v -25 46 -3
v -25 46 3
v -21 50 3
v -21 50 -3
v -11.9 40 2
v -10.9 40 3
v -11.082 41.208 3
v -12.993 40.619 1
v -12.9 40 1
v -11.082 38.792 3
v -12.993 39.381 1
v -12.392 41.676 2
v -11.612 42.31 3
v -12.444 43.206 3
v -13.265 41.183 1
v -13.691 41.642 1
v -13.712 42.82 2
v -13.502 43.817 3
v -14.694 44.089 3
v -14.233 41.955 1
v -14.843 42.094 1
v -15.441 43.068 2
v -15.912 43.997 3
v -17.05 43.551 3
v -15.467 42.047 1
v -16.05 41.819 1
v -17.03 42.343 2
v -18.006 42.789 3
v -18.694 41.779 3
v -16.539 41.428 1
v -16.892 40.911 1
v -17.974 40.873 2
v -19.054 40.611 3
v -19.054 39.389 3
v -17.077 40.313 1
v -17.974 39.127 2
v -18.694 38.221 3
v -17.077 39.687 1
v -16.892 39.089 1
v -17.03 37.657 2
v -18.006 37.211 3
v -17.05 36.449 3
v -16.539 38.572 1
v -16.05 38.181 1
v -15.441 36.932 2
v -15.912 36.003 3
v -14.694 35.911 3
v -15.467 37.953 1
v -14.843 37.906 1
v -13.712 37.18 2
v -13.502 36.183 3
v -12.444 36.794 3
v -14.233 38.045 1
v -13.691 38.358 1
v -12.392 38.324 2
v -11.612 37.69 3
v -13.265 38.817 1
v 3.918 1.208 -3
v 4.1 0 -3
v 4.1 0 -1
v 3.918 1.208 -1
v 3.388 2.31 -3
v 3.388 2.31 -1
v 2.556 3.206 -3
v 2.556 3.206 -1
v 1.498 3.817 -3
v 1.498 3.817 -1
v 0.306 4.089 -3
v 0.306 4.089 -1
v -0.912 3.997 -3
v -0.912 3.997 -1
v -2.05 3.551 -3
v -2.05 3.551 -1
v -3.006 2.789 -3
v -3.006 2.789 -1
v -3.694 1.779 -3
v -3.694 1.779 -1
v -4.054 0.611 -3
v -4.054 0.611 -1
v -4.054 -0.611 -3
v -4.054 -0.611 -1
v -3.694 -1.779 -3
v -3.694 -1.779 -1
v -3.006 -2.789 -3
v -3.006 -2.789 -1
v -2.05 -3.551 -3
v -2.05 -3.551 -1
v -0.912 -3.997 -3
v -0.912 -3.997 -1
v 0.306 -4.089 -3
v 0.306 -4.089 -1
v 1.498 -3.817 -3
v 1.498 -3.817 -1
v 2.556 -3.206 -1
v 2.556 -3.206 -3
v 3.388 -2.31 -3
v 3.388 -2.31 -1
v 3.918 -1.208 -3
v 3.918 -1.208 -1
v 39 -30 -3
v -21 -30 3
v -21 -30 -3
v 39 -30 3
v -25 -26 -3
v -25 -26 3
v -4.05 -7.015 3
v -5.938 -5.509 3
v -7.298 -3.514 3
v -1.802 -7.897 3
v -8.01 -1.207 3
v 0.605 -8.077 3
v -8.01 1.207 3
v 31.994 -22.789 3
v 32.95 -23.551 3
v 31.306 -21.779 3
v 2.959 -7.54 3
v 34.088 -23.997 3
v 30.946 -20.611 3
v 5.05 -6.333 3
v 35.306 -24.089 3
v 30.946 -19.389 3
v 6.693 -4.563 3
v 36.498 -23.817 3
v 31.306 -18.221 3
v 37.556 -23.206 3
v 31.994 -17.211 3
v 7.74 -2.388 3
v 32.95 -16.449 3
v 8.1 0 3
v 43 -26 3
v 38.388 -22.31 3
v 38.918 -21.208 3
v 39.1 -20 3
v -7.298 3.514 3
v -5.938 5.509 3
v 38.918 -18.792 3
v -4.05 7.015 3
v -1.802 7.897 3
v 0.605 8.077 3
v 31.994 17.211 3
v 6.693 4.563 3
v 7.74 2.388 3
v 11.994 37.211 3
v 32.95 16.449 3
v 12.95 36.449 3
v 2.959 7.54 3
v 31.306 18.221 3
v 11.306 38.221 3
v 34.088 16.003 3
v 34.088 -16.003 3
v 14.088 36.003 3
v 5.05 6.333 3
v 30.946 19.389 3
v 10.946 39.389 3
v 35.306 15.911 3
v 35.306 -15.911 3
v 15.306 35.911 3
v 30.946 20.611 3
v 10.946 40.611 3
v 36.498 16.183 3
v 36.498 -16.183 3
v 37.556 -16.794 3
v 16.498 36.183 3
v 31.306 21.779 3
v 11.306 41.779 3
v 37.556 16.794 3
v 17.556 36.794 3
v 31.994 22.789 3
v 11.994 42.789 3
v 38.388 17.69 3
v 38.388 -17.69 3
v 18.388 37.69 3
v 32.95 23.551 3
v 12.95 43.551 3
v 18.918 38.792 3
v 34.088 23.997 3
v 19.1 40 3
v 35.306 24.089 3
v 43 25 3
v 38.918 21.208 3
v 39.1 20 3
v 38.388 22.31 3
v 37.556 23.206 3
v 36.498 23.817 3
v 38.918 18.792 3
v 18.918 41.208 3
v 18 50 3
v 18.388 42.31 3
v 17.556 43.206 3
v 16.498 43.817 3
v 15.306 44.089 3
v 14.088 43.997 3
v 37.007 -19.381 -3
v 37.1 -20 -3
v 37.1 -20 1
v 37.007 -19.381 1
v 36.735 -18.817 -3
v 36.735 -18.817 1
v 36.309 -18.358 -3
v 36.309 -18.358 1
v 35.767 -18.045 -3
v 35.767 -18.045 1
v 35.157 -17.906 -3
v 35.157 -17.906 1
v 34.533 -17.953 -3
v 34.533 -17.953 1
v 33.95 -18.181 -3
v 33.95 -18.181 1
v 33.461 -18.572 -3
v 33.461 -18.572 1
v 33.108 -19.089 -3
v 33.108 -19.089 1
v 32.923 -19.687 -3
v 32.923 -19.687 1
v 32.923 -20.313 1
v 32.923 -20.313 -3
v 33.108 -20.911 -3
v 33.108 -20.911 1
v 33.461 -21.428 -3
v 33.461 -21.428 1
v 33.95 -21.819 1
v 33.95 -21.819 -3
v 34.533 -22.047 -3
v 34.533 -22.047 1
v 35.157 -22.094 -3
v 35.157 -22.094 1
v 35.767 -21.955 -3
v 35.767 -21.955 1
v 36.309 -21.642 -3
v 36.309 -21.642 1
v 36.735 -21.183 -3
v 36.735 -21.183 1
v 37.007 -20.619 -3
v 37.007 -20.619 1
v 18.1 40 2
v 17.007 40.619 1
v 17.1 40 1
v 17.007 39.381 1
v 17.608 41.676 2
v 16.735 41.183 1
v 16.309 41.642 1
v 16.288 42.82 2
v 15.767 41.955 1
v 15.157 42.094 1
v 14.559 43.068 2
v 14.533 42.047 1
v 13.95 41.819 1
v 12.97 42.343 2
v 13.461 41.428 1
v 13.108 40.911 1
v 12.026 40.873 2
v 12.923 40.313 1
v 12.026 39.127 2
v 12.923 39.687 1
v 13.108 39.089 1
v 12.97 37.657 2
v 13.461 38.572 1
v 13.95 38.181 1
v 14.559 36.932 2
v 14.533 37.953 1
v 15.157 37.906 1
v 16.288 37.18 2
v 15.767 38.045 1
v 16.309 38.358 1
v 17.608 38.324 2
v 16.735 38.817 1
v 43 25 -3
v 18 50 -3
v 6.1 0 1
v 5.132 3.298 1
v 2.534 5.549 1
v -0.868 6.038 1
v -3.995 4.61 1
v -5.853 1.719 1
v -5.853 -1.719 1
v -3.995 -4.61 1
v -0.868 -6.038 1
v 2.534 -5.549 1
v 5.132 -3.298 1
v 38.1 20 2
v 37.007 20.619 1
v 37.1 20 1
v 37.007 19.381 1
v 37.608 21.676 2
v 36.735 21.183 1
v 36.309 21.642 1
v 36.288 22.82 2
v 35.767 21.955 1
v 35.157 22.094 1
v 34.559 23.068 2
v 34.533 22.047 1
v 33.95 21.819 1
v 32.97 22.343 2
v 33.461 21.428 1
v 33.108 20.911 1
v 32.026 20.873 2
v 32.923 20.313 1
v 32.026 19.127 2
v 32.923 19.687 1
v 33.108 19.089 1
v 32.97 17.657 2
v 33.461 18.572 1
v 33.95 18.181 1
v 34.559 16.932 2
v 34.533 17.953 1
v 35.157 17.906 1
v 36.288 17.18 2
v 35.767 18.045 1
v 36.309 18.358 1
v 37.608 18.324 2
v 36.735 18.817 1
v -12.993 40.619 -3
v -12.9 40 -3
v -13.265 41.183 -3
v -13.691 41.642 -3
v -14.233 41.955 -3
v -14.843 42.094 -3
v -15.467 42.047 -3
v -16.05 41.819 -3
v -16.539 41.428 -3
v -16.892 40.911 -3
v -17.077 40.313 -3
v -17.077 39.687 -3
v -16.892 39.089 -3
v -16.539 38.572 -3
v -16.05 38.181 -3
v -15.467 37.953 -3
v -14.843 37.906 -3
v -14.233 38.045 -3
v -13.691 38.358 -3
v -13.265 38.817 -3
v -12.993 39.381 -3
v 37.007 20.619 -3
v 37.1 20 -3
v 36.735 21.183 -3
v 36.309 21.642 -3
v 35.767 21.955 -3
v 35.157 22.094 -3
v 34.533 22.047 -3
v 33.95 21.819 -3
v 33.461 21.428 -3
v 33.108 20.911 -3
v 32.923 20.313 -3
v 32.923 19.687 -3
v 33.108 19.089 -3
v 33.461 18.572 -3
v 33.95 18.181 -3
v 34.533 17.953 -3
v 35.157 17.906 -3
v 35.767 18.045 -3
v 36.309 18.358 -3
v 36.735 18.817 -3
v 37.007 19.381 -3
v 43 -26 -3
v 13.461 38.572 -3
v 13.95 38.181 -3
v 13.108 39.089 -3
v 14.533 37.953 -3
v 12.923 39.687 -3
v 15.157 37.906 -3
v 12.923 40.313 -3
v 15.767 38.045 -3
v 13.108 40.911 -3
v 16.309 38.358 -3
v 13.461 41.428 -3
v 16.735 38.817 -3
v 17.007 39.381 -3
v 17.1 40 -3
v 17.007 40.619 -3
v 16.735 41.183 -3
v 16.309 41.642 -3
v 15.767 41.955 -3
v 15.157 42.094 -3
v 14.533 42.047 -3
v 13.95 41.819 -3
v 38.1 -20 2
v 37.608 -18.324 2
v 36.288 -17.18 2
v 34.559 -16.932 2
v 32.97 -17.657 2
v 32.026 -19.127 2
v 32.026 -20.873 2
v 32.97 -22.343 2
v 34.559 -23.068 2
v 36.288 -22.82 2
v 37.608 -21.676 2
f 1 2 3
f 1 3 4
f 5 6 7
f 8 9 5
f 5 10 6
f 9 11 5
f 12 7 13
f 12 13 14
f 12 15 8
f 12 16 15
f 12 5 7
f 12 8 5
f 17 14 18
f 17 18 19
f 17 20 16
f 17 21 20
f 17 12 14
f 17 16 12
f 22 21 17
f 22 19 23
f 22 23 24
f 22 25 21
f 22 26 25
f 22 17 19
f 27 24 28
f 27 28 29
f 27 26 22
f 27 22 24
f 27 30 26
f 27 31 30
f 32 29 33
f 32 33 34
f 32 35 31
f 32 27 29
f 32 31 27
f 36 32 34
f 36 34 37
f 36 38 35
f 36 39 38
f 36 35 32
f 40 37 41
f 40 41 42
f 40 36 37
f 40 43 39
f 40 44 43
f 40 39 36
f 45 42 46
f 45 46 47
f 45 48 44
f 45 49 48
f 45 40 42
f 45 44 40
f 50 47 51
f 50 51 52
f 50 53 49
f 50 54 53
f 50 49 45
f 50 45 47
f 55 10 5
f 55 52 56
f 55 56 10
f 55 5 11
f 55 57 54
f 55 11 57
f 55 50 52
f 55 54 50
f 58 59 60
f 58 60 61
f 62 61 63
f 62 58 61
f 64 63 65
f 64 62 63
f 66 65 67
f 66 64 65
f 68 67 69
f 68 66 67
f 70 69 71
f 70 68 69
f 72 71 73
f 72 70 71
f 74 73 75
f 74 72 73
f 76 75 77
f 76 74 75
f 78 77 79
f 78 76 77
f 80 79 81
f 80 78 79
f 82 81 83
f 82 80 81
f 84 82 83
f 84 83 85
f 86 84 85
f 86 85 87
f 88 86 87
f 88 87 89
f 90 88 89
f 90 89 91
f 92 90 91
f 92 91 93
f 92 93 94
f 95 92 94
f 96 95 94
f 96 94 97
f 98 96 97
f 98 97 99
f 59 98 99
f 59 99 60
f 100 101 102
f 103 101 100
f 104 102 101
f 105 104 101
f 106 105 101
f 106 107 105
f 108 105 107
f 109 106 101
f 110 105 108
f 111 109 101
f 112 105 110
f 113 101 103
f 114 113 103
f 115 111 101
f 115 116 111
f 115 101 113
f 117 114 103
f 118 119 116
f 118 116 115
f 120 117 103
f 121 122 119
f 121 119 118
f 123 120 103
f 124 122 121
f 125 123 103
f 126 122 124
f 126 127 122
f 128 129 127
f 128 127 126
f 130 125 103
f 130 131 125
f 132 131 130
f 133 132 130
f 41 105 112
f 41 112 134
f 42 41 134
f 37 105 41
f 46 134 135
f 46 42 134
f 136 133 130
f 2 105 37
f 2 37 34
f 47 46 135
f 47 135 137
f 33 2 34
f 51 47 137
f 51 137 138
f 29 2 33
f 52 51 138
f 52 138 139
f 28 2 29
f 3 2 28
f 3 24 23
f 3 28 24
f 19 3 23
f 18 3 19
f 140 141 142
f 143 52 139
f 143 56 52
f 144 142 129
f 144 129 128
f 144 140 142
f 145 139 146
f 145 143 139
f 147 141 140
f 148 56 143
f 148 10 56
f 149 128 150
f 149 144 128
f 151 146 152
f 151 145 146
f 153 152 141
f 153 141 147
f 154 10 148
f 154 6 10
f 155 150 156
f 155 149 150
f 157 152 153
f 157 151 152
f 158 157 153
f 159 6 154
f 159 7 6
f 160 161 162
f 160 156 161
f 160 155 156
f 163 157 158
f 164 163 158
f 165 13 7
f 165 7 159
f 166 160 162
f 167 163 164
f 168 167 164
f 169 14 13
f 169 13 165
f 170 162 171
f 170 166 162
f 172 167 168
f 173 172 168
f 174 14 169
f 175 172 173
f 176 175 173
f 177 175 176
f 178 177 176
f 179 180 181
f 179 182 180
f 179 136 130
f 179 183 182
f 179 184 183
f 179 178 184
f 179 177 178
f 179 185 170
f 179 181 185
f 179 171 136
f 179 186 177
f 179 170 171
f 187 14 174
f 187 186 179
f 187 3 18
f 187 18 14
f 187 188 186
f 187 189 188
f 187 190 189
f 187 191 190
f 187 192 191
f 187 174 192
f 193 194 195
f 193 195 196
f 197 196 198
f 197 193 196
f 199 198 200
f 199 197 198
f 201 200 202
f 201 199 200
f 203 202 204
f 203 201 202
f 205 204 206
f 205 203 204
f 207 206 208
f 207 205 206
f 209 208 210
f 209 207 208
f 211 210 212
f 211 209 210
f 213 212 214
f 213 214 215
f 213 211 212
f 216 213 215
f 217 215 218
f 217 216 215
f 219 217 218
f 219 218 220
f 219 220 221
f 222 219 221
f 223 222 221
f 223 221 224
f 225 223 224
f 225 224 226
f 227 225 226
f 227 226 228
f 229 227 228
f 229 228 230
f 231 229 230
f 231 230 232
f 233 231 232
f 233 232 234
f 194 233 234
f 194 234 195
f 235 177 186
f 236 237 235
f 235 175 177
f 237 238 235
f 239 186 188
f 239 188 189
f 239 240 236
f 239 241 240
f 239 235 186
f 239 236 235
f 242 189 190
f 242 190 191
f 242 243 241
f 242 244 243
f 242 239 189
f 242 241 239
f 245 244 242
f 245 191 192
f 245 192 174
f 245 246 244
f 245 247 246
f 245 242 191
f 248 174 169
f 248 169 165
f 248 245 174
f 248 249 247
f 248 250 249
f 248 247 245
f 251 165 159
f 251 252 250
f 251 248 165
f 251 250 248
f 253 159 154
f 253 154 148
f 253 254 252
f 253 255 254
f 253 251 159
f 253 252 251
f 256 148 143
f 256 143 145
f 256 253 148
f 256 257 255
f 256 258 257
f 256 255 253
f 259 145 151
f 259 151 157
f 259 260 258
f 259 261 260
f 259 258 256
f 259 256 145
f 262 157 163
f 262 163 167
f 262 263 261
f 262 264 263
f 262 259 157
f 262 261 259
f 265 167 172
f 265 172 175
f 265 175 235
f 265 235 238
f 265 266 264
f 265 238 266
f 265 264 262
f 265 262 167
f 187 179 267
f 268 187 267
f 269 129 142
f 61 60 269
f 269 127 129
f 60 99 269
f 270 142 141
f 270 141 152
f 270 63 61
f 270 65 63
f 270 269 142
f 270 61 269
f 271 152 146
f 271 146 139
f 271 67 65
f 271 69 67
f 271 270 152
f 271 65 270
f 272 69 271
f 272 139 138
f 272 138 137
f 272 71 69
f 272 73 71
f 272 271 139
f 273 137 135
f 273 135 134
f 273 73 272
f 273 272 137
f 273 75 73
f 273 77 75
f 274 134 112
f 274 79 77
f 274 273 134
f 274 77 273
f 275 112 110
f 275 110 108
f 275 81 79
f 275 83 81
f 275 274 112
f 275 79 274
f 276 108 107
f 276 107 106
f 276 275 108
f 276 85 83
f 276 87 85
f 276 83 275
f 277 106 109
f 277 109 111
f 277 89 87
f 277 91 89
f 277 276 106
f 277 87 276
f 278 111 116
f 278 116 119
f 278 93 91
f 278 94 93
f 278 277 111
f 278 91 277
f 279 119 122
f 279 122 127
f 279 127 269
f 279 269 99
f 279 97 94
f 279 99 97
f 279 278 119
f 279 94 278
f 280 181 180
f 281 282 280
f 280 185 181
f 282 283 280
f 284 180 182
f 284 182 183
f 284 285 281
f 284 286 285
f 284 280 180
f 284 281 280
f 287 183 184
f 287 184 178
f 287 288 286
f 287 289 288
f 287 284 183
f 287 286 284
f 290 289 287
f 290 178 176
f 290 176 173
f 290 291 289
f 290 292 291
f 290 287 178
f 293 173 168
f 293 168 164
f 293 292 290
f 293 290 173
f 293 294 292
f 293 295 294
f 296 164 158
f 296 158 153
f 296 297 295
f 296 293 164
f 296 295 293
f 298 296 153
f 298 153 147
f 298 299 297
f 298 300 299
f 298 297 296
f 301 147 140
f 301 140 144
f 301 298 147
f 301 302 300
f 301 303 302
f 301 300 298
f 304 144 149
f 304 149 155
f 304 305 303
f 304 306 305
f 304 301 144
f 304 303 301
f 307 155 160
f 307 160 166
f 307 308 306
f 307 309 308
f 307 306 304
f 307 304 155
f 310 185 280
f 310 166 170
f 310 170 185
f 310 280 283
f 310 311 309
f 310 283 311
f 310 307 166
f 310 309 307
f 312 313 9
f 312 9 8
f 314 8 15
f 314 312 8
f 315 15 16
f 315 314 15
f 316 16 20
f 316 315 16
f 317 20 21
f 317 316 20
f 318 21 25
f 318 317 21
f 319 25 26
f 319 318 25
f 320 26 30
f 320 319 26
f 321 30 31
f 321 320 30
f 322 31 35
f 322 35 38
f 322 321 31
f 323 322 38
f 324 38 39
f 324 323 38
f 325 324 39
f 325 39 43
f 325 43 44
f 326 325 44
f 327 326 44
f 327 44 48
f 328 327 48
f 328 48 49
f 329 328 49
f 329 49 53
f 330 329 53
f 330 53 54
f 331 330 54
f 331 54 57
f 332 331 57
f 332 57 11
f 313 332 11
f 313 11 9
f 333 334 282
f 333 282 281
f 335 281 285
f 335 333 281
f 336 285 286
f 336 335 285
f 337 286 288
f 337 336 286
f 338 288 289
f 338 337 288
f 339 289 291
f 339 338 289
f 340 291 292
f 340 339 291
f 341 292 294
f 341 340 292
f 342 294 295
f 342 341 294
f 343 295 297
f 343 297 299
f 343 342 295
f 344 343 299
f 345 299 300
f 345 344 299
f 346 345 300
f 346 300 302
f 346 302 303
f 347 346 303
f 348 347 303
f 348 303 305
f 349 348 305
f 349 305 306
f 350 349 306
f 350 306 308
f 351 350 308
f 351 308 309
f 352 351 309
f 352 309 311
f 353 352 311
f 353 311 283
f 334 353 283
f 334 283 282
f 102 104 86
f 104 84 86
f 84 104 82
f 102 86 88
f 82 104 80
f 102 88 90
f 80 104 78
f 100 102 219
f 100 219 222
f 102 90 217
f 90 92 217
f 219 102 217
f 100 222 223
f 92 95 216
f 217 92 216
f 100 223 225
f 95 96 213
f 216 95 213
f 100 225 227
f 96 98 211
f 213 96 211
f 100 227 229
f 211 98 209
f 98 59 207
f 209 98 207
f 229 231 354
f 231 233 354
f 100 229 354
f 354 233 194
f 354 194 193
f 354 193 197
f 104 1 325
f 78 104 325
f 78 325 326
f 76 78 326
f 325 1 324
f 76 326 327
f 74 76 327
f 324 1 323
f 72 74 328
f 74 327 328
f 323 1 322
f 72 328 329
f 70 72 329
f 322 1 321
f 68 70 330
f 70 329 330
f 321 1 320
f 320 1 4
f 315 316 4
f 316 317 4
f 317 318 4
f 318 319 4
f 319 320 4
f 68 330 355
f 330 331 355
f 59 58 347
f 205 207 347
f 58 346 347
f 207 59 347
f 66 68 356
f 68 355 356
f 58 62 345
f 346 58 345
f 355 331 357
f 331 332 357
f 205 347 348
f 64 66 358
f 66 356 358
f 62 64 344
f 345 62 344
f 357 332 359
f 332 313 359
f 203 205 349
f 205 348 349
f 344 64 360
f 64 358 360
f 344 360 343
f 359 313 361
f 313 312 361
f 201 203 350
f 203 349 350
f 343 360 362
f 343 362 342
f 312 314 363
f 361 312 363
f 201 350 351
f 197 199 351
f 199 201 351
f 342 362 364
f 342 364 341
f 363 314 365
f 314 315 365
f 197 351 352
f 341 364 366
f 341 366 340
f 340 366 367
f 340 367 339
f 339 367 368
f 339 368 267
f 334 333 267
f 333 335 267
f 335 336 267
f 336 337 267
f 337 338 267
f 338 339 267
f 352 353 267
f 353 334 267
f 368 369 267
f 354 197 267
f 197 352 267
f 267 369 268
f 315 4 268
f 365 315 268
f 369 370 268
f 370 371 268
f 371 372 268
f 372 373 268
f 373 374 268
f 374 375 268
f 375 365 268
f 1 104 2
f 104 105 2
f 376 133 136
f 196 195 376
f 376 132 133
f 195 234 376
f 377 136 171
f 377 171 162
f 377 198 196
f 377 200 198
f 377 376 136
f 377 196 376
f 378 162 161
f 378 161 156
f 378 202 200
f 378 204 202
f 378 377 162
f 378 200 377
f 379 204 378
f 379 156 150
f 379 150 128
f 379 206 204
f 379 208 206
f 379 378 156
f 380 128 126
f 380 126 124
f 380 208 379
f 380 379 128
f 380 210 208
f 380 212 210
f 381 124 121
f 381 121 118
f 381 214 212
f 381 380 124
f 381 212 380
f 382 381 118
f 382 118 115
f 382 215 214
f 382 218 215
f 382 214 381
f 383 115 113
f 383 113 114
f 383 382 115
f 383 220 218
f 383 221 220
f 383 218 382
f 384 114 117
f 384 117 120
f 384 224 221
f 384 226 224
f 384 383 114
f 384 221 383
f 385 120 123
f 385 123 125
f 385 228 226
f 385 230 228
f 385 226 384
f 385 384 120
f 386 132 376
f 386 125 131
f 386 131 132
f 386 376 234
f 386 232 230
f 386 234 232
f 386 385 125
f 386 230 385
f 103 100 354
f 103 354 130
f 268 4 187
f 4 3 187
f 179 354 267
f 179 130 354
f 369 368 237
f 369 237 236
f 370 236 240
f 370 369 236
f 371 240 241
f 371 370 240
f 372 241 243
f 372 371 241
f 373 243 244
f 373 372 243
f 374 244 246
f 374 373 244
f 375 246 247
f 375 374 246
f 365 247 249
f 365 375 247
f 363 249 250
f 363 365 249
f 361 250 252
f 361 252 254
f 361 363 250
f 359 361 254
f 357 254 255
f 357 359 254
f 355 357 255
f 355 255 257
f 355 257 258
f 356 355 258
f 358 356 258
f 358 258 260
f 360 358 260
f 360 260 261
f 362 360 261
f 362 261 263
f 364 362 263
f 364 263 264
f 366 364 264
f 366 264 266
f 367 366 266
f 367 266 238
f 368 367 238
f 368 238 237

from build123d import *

# Parameters (mm, degrees)
SKETCH_1_W      = 68
SKETCH_1_H      = 80
SKETCH_1_R      = 4.1
SKETCH_1_R_2    = 2.1
EXTRUDE_1_DEPTH = 3
CHAMFER_1_SIZE  = 25
CHAMFER_2_SIZE  = 4
CHAMFER_3_SIZE  = 2


with BuildPart() as part:
    # 草图1 → 凸台-拉伸1 (new, symmetric)
    with BuildSketch(Plane.XY):
        with Locations((9, 10)):
            Rectangle(SKETCH_1_W, SKETCH_1_H)
        Circle(SKETCH_1_R, mode=Mode.SUBTRACT)
        with Locations((35, 20)):
            Circle(SKETCH_1_R_2, mode=Mode.SUBTRACT)
        with Locations((35, -20)):
            Circle(SKETCH_1_R_2, mode=Mode.SUBTRACT)
        with Locations((-15, 40)):
            Circle(SKETCH_1_R_2, mode=Mode.SUBTRACT)
        with Locations((15, 40)):
            Circle(SKETCH_1_R_2, mode=Mode.SUBTRACT)
    extrude(amount=EXTRUDE_1_DEPTH, both=True)

    # 倒角1
    chamfer_1_edges = [part.edges().sort_by_distance(p)[0] for p in [
        (43, 50, 0),
    ]]
    chamfer(chamfer_1_edges, length=CHAMFER_1_SIZE)

    # 倒角2
    chamfer_2_edges = [part.edges().sort_by_distance(p)[0] for p in [
        (-4.1, 0, 3),
        (-25, 50, 0),
        (43, -30, 0),
        (-25, -30, 0),
    ]]
    chamfer(chamfer_2_edges, length=CHAMFER_2_SIZE)

    # 倒角3
    chamfer_3_edges = [part.edges().sort_by_distance(p)[0] for p in [
        (32.9, 20, 3),
        (32.9, -20, 3),
        (-17.1, 40, 3),
        (12.9, 40, 3),
    ]]
    chamfer(chamfer_3_edges, length=CHAMFER_3_SIZE)


solid = part.part
